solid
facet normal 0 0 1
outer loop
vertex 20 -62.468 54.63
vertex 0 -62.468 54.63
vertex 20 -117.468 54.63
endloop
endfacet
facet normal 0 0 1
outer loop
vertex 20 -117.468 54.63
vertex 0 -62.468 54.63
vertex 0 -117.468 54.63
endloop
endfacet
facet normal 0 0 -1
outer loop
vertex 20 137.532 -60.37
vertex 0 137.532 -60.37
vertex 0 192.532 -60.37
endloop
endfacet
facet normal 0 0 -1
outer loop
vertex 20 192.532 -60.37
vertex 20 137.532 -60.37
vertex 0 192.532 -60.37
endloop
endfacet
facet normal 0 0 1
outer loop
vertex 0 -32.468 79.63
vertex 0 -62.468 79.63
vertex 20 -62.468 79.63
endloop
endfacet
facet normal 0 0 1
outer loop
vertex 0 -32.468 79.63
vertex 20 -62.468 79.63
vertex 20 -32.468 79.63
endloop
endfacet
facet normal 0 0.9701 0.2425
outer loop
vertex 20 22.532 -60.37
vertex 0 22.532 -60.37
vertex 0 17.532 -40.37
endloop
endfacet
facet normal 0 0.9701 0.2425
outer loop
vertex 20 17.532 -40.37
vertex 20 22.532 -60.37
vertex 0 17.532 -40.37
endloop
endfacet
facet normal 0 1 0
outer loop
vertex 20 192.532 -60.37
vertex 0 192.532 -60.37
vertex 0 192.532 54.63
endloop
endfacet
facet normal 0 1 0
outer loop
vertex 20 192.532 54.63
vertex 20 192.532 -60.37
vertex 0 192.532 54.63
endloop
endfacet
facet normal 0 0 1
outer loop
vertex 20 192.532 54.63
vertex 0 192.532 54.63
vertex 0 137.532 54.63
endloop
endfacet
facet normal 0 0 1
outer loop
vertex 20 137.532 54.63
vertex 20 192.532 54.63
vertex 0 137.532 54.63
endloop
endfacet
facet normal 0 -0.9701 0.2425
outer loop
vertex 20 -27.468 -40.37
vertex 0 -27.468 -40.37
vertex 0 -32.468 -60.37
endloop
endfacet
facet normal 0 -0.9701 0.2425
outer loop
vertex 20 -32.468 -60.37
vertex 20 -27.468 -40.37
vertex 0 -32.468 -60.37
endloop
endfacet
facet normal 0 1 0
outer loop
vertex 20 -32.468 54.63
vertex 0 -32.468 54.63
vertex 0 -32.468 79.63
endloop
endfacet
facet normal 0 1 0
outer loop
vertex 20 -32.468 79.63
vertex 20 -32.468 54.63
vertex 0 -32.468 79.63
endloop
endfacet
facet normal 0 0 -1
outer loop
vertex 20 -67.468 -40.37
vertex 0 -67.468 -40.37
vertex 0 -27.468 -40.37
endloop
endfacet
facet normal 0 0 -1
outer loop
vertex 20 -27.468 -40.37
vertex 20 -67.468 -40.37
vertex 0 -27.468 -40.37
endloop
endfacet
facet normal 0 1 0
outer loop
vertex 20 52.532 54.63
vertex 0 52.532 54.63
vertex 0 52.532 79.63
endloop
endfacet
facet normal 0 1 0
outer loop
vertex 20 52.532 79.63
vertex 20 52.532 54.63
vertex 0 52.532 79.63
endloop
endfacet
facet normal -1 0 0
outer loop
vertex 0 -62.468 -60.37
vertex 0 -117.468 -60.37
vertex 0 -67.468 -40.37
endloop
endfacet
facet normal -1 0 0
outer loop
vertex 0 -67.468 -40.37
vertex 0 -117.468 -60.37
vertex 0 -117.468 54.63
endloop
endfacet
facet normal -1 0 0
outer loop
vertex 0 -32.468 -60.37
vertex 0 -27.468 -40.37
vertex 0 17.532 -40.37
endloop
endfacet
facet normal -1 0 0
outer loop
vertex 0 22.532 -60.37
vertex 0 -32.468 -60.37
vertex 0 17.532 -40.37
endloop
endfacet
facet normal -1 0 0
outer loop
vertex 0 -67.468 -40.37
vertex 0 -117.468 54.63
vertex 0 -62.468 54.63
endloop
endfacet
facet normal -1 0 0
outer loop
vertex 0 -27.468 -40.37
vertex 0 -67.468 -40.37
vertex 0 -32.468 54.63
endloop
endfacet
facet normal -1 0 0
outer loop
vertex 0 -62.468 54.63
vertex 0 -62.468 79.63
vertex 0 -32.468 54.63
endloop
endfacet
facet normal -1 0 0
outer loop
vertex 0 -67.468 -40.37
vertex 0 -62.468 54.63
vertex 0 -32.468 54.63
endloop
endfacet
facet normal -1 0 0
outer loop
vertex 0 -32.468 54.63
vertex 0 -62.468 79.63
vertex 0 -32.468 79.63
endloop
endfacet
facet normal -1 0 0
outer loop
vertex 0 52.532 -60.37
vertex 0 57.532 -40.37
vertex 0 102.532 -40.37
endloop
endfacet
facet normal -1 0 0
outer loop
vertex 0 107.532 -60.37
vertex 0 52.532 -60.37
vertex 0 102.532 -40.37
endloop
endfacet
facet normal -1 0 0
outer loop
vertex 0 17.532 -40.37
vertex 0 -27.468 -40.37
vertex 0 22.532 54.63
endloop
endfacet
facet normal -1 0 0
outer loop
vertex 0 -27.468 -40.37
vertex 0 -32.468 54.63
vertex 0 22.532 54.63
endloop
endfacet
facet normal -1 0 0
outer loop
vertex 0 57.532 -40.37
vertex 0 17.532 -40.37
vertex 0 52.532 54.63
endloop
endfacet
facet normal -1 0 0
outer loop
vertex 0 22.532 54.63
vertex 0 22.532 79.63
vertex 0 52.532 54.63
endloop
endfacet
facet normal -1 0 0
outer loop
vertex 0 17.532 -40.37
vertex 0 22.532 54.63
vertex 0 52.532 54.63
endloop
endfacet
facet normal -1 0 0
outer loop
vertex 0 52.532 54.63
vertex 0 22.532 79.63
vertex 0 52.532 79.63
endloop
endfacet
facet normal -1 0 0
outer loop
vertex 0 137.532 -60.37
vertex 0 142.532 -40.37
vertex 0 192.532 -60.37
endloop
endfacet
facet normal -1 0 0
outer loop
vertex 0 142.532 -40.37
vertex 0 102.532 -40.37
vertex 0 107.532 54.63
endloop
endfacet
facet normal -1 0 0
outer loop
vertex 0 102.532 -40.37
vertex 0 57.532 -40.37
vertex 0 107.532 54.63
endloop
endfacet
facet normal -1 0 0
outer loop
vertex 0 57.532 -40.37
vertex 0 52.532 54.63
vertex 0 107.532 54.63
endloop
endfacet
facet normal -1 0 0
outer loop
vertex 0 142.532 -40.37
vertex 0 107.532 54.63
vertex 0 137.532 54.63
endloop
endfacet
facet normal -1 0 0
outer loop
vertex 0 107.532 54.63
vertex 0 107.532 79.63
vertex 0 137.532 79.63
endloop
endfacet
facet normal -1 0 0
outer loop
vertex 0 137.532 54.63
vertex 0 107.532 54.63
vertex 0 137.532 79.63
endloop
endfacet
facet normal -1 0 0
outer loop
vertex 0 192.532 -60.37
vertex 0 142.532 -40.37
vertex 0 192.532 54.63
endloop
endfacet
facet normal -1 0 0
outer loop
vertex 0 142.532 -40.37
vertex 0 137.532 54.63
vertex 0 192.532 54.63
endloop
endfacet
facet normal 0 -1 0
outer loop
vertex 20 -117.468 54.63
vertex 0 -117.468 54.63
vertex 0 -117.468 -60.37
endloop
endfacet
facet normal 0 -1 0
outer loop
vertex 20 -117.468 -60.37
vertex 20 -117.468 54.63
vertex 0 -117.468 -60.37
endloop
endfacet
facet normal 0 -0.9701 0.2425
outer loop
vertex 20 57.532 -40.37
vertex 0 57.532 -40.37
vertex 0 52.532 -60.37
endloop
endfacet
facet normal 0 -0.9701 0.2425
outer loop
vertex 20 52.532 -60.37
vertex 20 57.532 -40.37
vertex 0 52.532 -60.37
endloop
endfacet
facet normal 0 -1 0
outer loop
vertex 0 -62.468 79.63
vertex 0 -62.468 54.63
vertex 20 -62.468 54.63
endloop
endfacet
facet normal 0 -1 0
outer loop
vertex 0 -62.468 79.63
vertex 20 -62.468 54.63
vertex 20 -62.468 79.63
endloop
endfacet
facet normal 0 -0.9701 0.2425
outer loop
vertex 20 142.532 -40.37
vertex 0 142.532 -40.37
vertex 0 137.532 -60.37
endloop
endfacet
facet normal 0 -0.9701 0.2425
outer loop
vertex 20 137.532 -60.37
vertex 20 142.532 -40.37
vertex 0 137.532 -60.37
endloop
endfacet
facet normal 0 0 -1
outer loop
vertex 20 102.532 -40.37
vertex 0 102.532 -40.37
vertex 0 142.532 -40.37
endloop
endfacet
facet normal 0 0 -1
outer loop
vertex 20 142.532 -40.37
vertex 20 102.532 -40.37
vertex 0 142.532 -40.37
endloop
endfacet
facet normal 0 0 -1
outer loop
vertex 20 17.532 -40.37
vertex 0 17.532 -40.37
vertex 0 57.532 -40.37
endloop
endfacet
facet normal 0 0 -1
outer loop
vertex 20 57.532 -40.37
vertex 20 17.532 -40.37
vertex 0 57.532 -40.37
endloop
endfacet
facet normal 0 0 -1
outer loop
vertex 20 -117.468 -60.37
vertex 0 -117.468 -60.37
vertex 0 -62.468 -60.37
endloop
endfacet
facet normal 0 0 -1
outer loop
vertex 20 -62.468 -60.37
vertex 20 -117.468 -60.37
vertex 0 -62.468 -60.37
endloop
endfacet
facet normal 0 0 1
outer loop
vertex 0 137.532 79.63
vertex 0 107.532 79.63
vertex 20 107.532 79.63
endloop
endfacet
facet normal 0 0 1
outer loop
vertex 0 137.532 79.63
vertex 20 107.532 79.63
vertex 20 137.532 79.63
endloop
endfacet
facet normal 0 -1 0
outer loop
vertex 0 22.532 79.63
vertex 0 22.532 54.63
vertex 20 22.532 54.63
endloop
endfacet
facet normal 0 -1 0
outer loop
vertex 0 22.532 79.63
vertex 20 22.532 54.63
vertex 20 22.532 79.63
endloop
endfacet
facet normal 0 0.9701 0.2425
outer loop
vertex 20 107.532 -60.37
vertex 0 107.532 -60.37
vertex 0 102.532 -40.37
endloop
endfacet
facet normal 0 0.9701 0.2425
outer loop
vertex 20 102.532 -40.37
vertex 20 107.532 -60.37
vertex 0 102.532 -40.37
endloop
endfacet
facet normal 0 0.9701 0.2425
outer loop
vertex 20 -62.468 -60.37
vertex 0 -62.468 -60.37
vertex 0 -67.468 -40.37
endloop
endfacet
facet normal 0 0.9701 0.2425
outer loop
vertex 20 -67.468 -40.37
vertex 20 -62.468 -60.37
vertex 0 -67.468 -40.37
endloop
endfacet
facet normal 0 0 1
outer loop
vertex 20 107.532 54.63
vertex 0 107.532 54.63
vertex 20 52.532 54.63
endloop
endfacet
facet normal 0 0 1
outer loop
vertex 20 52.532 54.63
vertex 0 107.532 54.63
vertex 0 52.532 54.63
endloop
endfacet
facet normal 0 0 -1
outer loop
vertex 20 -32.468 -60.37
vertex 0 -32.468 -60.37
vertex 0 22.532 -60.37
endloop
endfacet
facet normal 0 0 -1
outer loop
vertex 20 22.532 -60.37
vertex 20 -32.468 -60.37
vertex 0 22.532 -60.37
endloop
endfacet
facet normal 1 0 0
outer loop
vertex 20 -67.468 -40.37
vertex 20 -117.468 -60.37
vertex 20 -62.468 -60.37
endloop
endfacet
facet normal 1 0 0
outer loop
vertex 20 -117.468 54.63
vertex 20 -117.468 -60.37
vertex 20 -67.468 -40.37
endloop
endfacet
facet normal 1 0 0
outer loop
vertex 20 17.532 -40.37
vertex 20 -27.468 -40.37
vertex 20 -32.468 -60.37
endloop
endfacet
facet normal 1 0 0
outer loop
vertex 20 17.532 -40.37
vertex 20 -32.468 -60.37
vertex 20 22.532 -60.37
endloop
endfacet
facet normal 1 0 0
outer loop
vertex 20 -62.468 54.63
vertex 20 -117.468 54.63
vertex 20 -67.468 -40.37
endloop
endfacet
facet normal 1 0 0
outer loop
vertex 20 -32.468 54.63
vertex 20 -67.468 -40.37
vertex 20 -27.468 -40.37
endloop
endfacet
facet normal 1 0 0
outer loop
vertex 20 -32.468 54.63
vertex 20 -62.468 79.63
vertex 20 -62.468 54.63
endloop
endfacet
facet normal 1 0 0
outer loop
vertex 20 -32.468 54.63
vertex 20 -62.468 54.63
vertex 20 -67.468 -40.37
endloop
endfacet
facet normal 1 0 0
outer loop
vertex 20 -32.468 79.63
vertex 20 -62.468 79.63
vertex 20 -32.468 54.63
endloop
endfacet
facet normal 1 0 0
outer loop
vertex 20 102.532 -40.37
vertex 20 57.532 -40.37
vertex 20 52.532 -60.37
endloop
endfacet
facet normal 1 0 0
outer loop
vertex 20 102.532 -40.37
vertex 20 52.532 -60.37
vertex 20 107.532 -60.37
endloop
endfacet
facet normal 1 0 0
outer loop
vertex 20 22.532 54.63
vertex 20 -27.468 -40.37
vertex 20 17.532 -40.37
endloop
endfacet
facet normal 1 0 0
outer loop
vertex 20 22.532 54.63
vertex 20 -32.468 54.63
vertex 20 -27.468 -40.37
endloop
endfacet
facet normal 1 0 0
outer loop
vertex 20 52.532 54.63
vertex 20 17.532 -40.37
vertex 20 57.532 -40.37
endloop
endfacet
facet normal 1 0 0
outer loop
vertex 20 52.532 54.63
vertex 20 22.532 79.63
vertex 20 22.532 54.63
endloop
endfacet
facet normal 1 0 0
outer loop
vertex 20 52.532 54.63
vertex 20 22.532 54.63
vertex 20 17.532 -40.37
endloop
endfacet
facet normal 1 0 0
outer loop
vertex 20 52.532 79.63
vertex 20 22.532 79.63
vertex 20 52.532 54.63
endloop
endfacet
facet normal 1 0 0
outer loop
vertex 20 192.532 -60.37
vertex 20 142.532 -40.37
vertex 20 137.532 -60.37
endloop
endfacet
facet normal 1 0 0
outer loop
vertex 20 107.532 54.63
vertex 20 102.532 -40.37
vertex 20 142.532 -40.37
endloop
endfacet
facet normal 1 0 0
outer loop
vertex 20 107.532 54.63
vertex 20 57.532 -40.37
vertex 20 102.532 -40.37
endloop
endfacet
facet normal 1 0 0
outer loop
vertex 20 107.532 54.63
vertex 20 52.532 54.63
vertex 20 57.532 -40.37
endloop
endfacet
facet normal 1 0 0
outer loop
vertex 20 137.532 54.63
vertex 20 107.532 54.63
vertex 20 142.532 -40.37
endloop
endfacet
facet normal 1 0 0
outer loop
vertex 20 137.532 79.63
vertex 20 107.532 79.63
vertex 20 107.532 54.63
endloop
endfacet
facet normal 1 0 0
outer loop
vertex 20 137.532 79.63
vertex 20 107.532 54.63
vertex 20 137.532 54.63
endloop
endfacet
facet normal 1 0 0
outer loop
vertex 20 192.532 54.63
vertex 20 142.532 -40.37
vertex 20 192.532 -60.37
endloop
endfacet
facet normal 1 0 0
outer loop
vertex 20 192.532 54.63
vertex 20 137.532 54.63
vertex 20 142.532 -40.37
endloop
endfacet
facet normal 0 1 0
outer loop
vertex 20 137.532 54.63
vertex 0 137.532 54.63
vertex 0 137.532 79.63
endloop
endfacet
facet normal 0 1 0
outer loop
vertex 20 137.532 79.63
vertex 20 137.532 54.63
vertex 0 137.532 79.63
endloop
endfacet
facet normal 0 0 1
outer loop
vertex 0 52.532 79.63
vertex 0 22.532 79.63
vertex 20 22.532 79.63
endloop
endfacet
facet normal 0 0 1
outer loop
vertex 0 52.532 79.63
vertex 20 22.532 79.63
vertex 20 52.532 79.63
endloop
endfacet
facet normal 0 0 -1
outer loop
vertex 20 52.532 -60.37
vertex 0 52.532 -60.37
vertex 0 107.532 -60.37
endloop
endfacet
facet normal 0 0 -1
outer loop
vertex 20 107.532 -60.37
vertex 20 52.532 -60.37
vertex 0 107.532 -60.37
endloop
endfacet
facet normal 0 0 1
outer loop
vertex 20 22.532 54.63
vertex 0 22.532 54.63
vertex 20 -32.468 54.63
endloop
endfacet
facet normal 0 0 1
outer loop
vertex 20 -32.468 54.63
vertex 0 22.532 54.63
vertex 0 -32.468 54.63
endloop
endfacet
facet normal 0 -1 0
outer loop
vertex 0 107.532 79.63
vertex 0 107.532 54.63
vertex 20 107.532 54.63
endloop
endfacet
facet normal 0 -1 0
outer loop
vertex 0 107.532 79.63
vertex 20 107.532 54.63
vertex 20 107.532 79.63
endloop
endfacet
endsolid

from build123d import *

# Parameters (mm, degrees)
F0_W     = 30
F0_H     = 25
F1_DEPTH = 20


with BuildPart() as f1:
    # F0 (on Right) → F1 (new body)
    with BuildSketch(Plane.YZ):
        Polygon((-62.467675, 54.630118), (-117.467675, 54.630118), (-117.467675, -60.369882), (-62.467675, -60.369882), (-67.467675, -40.369882), (-27.467675, -40.369882), (-32.467675, -60.369882), (22.532325, -60.369882), (17.532325, -40.369882), (57.532325, -40.369882), (52.532325, -60.369882), (107.532325, -60.369882), (102.532325, -40.369882), (142.532325, -40.369882), (137.532325, -60.369882), (192.532325, -60.369882), (192.532325, 54.630118), (137.532325, 54.630118), (107.532325, 54.630118), (52.532325, 54.630118), (22.532325, 54.630118), (-32.467675, 54.630118), align=None)
        with Locations((122.532325, 67.130118)):
            Rectangle(F0_W, F0_H)
        with Locations((37.532325, 67.130118)):
            Rectangle(F0_W, F0_H)
        with Locations((-47.467675, 67.130118)):
            Rectangle(F0_W, F0_H)
    extrude(amount=F1_DEPTH)


solid = f1.part
